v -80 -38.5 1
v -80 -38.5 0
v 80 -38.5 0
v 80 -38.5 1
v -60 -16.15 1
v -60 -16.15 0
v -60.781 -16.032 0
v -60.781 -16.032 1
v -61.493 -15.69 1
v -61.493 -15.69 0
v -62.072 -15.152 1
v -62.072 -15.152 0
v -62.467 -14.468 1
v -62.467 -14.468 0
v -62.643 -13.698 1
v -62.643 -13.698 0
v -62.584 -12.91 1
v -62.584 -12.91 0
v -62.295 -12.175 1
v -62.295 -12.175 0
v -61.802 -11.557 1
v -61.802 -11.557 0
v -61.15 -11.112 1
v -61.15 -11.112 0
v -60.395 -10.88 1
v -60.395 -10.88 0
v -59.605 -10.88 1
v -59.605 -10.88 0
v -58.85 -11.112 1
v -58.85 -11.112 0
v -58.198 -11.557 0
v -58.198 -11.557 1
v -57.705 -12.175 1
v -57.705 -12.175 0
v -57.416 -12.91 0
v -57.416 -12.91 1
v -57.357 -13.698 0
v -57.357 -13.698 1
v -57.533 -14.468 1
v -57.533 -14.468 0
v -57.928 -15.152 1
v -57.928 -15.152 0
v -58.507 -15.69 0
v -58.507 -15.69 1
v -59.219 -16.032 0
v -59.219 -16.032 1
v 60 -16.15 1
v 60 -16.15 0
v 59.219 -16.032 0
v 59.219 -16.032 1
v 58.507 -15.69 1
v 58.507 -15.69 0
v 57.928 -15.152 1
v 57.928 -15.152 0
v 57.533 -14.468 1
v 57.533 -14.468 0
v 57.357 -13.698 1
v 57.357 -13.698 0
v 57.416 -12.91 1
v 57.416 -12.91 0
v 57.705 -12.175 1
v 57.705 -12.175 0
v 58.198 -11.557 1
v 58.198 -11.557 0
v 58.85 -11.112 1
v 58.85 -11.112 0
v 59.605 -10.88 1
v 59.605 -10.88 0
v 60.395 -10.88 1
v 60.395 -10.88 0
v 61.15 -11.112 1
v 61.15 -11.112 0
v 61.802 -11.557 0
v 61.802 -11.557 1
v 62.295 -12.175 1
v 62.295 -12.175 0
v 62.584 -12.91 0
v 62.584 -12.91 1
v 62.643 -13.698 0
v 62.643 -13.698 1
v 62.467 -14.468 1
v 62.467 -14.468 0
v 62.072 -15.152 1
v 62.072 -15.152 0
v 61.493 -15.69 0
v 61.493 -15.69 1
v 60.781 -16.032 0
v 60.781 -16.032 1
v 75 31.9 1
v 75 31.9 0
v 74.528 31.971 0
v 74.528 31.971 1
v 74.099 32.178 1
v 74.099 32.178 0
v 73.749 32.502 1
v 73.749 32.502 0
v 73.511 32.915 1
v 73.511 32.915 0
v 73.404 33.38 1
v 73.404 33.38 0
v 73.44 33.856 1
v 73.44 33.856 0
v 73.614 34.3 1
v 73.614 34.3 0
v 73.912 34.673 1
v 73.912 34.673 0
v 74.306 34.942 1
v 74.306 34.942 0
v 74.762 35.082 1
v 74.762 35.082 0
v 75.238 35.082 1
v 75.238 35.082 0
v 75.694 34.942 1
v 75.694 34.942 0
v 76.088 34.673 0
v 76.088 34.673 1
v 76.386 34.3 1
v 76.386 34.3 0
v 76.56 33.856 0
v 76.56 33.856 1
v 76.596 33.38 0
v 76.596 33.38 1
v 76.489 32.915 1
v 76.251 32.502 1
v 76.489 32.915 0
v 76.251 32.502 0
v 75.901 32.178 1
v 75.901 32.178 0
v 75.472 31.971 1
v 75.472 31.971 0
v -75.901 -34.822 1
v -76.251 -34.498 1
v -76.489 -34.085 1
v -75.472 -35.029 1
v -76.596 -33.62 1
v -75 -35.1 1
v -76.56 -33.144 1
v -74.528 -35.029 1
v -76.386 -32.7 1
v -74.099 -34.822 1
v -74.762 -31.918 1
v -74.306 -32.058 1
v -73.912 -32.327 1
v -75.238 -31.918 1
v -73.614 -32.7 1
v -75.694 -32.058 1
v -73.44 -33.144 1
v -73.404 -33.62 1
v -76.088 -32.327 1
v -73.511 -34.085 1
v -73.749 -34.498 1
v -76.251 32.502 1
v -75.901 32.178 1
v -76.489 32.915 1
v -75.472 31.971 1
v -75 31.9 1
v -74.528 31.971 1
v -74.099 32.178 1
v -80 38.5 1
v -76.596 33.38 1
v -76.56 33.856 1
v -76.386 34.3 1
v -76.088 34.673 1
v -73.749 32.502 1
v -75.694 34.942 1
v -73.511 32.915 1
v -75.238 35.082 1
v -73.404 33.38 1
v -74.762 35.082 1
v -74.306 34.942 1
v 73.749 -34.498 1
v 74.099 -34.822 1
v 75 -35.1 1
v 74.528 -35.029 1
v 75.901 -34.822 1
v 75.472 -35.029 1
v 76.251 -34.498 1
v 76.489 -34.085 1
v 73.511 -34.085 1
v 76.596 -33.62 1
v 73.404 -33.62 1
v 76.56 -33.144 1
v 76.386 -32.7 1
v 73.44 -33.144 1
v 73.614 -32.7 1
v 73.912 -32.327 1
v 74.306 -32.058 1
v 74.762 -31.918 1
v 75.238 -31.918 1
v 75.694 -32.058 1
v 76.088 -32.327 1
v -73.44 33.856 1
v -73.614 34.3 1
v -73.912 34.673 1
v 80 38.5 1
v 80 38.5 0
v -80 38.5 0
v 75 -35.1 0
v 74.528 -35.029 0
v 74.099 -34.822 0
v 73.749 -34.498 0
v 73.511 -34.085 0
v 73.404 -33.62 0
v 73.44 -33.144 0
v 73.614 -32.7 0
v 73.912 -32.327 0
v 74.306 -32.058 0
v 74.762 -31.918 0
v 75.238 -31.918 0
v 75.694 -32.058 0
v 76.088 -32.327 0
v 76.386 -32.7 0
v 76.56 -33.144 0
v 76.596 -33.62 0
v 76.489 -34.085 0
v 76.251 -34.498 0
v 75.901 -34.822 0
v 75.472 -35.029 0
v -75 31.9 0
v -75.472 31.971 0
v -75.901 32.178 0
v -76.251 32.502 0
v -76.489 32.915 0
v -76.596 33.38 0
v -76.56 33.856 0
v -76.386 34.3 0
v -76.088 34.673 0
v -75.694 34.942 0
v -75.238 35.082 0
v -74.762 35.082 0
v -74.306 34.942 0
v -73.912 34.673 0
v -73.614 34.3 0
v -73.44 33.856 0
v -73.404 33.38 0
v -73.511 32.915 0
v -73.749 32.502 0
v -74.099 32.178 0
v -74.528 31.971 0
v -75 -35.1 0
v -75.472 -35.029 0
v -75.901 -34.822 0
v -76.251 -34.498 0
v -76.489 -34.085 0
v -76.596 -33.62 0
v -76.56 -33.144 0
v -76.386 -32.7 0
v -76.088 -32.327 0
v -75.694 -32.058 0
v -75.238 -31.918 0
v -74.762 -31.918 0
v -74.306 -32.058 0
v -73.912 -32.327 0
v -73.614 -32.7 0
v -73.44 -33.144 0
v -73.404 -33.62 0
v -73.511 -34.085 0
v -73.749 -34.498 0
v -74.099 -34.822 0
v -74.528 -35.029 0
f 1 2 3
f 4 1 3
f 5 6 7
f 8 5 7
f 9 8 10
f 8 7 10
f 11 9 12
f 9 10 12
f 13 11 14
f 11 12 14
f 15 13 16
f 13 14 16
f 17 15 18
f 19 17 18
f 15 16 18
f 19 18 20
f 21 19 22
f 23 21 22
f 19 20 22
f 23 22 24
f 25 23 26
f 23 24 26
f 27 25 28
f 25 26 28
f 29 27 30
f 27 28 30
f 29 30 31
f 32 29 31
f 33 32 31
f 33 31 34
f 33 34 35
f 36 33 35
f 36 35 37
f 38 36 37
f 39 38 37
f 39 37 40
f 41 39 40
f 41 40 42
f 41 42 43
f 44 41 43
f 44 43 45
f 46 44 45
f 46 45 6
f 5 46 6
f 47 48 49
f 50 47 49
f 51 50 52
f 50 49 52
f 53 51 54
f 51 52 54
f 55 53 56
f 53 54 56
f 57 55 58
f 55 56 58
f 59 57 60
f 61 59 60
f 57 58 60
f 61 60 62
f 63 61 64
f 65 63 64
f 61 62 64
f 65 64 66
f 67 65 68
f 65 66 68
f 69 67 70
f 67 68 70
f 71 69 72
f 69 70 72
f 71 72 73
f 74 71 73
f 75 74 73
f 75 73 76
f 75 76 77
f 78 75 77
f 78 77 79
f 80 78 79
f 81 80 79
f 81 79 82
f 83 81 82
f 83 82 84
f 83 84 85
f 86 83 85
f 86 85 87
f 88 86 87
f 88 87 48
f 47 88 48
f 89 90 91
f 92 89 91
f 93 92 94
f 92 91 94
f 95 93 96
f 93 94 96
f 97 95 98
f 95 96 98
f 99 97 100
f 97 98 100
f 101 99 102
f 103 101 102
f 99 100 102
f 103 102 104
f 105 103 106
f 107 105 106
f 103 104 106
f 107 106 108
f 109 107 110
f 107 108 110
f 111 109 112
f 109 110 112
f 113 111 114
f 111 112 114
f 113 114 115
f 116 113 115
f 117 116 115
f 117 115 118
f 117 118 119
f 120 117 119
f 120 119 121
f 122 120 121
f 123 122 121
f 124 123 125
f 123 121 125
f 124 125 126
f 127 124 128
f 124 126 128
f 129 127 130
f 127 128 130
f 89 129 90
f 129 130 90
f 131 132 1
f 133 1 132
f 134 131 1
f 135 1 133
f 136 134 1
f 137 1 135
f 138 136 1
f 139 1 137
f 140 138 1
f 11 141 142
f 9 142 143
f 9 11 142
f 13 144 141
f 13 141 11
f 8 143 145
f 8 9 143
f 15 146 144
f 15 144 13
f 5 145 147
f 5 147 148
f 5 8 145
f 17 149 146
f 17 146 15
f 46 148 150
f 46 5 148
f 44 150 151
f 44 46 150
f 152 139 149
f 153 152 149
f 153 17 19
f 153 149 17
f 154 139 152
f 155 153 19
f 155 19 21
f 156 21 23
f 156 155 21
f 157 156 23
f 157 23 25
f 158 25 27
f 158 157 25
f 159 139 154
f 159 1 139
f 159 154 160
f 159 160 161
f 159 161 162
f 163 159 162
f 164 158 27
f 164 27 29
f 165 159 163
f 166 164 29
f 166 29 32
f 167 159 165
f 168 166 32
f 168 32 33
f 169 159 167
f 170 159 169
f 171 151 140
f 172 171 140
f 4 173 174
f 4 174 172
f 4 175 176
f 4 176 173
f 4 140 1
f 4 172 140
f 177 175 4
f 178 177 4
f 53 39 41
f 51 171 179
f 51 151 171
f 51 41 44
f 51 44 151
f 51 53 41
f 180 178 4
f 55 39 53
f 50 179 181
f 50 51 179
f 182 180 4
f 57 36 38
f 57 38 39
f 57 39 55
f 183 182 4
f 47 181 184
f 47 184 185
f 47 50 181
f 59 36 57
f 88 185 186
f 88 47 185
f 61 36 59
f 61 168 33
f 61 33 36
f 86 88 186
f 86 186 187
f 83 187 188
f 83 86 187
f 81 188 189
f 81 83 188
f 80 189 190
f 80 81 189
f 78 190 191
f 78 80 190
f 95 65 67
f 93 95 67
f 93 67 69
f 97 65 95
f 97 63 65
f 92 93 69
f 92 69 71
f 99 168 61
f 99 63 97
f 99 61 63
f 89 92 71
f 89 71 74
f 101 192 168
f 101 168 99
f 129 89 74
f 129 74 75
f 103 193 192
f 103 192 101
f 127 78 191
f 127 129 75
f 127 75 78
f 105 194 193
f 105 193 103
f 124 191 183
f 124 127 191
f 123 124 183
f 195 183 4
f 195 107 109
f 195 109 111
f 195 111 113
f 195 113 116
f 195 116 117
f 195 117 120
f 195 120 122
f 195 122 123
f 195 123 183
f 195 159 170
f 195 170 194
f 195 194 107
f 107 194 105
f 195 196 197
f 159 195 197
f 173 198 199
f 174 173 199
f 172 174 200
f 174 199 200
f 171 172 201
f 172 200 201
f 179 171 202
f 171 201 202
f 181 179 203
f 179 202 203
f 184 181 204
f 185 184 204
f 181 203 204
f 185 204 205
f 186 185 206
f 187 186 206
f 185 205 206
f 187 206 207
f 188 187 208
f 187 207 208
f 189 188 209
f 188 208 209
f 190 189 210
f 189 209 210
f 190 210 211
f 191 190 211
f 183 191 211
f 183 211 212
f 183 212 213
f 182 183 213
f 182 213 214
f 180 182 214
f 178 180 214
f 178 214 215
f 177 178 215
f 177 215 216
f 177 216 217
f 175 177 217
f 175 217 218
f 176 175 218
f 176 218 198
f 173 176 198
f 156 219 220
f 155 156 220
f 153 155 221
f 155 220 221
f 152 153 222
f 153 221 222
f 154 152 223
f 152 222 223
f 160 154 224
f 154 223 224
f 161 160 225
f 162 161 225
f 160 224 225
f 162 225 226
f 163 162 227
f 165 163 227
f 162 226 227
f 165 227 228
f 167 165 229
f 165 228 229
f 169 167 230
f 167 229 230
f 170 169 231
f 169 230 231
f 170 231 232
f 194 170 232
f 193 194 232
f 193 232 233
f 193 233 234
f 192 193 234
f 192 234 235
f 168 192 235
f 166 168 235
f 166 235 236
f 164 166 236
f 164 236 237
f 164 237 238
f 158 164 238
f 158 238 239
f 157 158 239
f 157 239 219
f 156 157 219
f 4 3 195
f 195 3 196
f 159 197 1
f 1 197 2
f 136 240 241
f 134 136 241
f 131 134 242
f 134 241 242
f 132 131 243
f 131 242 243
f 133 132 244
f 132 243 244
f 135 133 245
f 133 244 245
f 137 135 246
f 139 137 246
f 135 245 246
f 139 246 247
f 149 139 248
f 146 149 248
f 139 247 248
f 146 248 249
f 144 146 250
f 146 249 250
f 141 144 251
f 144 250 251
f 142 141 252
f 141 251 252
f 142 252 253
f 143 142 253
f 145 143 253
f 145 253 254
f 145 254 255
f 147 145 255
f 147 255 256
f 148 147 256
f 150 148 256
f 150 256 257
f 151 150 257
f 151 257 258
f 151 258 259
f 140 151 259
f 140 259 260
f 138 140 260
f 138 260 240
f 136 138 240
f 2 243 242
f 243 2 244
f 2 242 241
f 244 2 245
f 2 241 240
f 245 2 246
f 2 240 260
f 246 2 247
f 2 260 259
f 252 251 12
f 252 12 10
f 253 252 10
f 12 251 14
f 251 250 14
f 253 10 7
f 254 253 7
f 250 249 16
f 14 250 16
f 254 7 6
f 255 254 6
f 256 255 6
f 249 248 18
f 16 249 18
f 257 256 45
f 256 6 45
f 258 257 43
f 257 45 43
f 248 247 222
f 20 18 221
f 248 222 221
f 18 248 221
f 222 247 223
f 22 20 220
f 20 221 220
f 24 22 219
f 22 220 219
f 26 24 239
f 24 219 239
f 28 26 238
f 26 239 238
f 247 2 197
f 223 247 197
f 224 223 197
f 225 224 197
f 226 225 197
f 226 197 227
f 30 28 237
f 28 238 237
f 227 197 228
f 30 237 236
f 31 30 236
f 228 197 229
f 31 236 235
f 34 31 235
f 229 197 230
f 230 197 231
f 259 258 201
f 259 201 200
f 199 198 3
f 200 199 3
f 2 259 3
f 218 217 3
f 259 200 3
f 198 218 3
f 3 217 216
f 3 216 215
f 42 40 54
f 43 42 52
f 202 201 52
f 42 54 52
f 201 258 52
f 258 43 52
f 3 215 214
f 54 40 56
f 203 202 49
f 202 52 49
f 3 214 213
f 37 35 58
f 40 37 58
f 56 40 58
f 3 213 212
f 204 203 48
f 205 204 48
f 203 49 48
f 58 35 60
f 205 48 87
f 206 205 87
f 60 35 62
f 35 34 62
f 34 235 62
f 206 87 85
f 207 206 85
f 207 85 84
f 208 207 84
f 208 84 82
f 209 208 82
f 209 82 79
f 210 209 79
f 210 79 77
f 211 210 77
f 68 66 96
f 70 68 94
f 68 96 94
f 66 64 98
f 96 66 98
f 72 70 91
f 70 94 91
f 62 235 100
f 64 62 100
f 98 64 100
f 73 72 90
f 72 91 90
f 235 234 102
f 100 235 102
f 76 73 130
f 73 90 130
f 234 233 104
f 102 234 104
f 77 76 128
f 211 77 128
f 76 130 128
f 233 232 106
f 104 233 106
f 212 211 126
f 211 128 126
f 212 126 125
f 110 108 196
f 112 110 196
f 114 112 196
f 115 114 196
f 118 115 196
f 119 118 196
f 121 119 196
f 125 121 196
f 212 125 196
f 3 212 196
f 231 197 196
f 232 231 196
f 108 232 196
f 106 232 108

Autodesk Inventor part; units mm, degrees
ref_plane "YZ Plane" through (0, 0, 0) normal (1, 0, 0) x (0, 1, 0)
ref_plane "XZ Plane" through (0, 0, 0) normal (0, 1, 0) x (-1, 0, 0)
ref_plane "XY Plane" through (0, 0, 0) normal (0, 0, 1) x (1, 0, 0)
sketch "スケッチ1" plane through (0, 0, 0) normal (0, 0, 1) x (1, 0, 0)
  line L0 (-80, -38.5) -> (80, -38.5)
  line L1 (80, -38.5) -> (80, 38.5)
  line L2 (80, 38.5) -> (-80, 38.5)
  line L3 (-80, 38.5) -> (-80, -38.5)
  line L4 (-80, -38.5) -> (80, 38.5) construction
  line L5 (80, -38.5) -> (-80, 38.5) construction
  point P0 (0, 0)
  dimension "d0" = 160
  dimension "d1" = 77
extrude "プレート1" add sketch "スケッチ1" along normal blind 1
sketch "スケッチ2" plane through (0, 0, 1) normal (0, 0, 1) x (1, 0, 0)
  line L0 (-80, -38.5) -> (-80, 38.5) projected
  line L1 (80, -38.5) -> (-80, -38.5) projected
  line L2 (80, 38.5) -> (80, -38.5) projected
  line L3 (-80, 38.5) -> (80, 38.5) projected
  line L4 (75, 33.5) -> (75, -33.5)
  line L5 (75, -33.5) -> (-75, -33.5)
  line L6 (-75, -33.5) -> (-75, 33.5)
  line L7 (-75, 33.5) -> (75, 33.5)
  point P0 (0, 0)
  dimension "d3" = 5
hole "穴1" at (-75, 33.5, 1) at (-75, -33.5, 1) at (75, -33.5, 1) at (75, 33.5, 1) direction (0, 0, -1) diameter 3.2 depth 1 clearance for "Flat Head Machine Screw" size "M3" standard "Ansi Metric M Profile"
sketch "スケッチ3" plane through (0, 0, 1) normal (0, 0, 1) x (1, 0, 0)
  line L0 (80, -38.5) -> (-80, -38.5) projected
  point P0 (0, 0)
  point P1 (-60, -13.5)
  point P2 (60, -13.5)
  dimension "d11" = 60
  dimension "d12" = 60
  dimension "d13" = 25
  dimension "d14" = 25
hole "穴2" at (-60, -13.5, 1) at (60, -13.5, 1) direction (0, 0, -1) diameter 5.3 end through all clearance for "Flat Head Machine Screw" size "M5" standard "Ansi Metric M Profile"
equation "\"d9\" = Thickness"
equation "\"d20\" = Thickness"
equation "\"d2\" = Thickness"
equation "\"BendRadius\" = Thickness"
equation "\"BendReliefWidth\" = Thickness"
equation "\"BendReliefDepth\" = 0.5 * Thickness"
equation "\"CornerReliefSize\" = 4 * Thickness"
equation "\"MinimumRemnant\" = 2 * Thickness"
equation "\"TransitionRadius\" = BendRadius"
equation "\"JacobiRadiusSize\" = Thickness"
equation "\"GapSize\" = Thickness"
equation "\"Thickness\" = 1"
properties part number "plate4" material "CFRP"
